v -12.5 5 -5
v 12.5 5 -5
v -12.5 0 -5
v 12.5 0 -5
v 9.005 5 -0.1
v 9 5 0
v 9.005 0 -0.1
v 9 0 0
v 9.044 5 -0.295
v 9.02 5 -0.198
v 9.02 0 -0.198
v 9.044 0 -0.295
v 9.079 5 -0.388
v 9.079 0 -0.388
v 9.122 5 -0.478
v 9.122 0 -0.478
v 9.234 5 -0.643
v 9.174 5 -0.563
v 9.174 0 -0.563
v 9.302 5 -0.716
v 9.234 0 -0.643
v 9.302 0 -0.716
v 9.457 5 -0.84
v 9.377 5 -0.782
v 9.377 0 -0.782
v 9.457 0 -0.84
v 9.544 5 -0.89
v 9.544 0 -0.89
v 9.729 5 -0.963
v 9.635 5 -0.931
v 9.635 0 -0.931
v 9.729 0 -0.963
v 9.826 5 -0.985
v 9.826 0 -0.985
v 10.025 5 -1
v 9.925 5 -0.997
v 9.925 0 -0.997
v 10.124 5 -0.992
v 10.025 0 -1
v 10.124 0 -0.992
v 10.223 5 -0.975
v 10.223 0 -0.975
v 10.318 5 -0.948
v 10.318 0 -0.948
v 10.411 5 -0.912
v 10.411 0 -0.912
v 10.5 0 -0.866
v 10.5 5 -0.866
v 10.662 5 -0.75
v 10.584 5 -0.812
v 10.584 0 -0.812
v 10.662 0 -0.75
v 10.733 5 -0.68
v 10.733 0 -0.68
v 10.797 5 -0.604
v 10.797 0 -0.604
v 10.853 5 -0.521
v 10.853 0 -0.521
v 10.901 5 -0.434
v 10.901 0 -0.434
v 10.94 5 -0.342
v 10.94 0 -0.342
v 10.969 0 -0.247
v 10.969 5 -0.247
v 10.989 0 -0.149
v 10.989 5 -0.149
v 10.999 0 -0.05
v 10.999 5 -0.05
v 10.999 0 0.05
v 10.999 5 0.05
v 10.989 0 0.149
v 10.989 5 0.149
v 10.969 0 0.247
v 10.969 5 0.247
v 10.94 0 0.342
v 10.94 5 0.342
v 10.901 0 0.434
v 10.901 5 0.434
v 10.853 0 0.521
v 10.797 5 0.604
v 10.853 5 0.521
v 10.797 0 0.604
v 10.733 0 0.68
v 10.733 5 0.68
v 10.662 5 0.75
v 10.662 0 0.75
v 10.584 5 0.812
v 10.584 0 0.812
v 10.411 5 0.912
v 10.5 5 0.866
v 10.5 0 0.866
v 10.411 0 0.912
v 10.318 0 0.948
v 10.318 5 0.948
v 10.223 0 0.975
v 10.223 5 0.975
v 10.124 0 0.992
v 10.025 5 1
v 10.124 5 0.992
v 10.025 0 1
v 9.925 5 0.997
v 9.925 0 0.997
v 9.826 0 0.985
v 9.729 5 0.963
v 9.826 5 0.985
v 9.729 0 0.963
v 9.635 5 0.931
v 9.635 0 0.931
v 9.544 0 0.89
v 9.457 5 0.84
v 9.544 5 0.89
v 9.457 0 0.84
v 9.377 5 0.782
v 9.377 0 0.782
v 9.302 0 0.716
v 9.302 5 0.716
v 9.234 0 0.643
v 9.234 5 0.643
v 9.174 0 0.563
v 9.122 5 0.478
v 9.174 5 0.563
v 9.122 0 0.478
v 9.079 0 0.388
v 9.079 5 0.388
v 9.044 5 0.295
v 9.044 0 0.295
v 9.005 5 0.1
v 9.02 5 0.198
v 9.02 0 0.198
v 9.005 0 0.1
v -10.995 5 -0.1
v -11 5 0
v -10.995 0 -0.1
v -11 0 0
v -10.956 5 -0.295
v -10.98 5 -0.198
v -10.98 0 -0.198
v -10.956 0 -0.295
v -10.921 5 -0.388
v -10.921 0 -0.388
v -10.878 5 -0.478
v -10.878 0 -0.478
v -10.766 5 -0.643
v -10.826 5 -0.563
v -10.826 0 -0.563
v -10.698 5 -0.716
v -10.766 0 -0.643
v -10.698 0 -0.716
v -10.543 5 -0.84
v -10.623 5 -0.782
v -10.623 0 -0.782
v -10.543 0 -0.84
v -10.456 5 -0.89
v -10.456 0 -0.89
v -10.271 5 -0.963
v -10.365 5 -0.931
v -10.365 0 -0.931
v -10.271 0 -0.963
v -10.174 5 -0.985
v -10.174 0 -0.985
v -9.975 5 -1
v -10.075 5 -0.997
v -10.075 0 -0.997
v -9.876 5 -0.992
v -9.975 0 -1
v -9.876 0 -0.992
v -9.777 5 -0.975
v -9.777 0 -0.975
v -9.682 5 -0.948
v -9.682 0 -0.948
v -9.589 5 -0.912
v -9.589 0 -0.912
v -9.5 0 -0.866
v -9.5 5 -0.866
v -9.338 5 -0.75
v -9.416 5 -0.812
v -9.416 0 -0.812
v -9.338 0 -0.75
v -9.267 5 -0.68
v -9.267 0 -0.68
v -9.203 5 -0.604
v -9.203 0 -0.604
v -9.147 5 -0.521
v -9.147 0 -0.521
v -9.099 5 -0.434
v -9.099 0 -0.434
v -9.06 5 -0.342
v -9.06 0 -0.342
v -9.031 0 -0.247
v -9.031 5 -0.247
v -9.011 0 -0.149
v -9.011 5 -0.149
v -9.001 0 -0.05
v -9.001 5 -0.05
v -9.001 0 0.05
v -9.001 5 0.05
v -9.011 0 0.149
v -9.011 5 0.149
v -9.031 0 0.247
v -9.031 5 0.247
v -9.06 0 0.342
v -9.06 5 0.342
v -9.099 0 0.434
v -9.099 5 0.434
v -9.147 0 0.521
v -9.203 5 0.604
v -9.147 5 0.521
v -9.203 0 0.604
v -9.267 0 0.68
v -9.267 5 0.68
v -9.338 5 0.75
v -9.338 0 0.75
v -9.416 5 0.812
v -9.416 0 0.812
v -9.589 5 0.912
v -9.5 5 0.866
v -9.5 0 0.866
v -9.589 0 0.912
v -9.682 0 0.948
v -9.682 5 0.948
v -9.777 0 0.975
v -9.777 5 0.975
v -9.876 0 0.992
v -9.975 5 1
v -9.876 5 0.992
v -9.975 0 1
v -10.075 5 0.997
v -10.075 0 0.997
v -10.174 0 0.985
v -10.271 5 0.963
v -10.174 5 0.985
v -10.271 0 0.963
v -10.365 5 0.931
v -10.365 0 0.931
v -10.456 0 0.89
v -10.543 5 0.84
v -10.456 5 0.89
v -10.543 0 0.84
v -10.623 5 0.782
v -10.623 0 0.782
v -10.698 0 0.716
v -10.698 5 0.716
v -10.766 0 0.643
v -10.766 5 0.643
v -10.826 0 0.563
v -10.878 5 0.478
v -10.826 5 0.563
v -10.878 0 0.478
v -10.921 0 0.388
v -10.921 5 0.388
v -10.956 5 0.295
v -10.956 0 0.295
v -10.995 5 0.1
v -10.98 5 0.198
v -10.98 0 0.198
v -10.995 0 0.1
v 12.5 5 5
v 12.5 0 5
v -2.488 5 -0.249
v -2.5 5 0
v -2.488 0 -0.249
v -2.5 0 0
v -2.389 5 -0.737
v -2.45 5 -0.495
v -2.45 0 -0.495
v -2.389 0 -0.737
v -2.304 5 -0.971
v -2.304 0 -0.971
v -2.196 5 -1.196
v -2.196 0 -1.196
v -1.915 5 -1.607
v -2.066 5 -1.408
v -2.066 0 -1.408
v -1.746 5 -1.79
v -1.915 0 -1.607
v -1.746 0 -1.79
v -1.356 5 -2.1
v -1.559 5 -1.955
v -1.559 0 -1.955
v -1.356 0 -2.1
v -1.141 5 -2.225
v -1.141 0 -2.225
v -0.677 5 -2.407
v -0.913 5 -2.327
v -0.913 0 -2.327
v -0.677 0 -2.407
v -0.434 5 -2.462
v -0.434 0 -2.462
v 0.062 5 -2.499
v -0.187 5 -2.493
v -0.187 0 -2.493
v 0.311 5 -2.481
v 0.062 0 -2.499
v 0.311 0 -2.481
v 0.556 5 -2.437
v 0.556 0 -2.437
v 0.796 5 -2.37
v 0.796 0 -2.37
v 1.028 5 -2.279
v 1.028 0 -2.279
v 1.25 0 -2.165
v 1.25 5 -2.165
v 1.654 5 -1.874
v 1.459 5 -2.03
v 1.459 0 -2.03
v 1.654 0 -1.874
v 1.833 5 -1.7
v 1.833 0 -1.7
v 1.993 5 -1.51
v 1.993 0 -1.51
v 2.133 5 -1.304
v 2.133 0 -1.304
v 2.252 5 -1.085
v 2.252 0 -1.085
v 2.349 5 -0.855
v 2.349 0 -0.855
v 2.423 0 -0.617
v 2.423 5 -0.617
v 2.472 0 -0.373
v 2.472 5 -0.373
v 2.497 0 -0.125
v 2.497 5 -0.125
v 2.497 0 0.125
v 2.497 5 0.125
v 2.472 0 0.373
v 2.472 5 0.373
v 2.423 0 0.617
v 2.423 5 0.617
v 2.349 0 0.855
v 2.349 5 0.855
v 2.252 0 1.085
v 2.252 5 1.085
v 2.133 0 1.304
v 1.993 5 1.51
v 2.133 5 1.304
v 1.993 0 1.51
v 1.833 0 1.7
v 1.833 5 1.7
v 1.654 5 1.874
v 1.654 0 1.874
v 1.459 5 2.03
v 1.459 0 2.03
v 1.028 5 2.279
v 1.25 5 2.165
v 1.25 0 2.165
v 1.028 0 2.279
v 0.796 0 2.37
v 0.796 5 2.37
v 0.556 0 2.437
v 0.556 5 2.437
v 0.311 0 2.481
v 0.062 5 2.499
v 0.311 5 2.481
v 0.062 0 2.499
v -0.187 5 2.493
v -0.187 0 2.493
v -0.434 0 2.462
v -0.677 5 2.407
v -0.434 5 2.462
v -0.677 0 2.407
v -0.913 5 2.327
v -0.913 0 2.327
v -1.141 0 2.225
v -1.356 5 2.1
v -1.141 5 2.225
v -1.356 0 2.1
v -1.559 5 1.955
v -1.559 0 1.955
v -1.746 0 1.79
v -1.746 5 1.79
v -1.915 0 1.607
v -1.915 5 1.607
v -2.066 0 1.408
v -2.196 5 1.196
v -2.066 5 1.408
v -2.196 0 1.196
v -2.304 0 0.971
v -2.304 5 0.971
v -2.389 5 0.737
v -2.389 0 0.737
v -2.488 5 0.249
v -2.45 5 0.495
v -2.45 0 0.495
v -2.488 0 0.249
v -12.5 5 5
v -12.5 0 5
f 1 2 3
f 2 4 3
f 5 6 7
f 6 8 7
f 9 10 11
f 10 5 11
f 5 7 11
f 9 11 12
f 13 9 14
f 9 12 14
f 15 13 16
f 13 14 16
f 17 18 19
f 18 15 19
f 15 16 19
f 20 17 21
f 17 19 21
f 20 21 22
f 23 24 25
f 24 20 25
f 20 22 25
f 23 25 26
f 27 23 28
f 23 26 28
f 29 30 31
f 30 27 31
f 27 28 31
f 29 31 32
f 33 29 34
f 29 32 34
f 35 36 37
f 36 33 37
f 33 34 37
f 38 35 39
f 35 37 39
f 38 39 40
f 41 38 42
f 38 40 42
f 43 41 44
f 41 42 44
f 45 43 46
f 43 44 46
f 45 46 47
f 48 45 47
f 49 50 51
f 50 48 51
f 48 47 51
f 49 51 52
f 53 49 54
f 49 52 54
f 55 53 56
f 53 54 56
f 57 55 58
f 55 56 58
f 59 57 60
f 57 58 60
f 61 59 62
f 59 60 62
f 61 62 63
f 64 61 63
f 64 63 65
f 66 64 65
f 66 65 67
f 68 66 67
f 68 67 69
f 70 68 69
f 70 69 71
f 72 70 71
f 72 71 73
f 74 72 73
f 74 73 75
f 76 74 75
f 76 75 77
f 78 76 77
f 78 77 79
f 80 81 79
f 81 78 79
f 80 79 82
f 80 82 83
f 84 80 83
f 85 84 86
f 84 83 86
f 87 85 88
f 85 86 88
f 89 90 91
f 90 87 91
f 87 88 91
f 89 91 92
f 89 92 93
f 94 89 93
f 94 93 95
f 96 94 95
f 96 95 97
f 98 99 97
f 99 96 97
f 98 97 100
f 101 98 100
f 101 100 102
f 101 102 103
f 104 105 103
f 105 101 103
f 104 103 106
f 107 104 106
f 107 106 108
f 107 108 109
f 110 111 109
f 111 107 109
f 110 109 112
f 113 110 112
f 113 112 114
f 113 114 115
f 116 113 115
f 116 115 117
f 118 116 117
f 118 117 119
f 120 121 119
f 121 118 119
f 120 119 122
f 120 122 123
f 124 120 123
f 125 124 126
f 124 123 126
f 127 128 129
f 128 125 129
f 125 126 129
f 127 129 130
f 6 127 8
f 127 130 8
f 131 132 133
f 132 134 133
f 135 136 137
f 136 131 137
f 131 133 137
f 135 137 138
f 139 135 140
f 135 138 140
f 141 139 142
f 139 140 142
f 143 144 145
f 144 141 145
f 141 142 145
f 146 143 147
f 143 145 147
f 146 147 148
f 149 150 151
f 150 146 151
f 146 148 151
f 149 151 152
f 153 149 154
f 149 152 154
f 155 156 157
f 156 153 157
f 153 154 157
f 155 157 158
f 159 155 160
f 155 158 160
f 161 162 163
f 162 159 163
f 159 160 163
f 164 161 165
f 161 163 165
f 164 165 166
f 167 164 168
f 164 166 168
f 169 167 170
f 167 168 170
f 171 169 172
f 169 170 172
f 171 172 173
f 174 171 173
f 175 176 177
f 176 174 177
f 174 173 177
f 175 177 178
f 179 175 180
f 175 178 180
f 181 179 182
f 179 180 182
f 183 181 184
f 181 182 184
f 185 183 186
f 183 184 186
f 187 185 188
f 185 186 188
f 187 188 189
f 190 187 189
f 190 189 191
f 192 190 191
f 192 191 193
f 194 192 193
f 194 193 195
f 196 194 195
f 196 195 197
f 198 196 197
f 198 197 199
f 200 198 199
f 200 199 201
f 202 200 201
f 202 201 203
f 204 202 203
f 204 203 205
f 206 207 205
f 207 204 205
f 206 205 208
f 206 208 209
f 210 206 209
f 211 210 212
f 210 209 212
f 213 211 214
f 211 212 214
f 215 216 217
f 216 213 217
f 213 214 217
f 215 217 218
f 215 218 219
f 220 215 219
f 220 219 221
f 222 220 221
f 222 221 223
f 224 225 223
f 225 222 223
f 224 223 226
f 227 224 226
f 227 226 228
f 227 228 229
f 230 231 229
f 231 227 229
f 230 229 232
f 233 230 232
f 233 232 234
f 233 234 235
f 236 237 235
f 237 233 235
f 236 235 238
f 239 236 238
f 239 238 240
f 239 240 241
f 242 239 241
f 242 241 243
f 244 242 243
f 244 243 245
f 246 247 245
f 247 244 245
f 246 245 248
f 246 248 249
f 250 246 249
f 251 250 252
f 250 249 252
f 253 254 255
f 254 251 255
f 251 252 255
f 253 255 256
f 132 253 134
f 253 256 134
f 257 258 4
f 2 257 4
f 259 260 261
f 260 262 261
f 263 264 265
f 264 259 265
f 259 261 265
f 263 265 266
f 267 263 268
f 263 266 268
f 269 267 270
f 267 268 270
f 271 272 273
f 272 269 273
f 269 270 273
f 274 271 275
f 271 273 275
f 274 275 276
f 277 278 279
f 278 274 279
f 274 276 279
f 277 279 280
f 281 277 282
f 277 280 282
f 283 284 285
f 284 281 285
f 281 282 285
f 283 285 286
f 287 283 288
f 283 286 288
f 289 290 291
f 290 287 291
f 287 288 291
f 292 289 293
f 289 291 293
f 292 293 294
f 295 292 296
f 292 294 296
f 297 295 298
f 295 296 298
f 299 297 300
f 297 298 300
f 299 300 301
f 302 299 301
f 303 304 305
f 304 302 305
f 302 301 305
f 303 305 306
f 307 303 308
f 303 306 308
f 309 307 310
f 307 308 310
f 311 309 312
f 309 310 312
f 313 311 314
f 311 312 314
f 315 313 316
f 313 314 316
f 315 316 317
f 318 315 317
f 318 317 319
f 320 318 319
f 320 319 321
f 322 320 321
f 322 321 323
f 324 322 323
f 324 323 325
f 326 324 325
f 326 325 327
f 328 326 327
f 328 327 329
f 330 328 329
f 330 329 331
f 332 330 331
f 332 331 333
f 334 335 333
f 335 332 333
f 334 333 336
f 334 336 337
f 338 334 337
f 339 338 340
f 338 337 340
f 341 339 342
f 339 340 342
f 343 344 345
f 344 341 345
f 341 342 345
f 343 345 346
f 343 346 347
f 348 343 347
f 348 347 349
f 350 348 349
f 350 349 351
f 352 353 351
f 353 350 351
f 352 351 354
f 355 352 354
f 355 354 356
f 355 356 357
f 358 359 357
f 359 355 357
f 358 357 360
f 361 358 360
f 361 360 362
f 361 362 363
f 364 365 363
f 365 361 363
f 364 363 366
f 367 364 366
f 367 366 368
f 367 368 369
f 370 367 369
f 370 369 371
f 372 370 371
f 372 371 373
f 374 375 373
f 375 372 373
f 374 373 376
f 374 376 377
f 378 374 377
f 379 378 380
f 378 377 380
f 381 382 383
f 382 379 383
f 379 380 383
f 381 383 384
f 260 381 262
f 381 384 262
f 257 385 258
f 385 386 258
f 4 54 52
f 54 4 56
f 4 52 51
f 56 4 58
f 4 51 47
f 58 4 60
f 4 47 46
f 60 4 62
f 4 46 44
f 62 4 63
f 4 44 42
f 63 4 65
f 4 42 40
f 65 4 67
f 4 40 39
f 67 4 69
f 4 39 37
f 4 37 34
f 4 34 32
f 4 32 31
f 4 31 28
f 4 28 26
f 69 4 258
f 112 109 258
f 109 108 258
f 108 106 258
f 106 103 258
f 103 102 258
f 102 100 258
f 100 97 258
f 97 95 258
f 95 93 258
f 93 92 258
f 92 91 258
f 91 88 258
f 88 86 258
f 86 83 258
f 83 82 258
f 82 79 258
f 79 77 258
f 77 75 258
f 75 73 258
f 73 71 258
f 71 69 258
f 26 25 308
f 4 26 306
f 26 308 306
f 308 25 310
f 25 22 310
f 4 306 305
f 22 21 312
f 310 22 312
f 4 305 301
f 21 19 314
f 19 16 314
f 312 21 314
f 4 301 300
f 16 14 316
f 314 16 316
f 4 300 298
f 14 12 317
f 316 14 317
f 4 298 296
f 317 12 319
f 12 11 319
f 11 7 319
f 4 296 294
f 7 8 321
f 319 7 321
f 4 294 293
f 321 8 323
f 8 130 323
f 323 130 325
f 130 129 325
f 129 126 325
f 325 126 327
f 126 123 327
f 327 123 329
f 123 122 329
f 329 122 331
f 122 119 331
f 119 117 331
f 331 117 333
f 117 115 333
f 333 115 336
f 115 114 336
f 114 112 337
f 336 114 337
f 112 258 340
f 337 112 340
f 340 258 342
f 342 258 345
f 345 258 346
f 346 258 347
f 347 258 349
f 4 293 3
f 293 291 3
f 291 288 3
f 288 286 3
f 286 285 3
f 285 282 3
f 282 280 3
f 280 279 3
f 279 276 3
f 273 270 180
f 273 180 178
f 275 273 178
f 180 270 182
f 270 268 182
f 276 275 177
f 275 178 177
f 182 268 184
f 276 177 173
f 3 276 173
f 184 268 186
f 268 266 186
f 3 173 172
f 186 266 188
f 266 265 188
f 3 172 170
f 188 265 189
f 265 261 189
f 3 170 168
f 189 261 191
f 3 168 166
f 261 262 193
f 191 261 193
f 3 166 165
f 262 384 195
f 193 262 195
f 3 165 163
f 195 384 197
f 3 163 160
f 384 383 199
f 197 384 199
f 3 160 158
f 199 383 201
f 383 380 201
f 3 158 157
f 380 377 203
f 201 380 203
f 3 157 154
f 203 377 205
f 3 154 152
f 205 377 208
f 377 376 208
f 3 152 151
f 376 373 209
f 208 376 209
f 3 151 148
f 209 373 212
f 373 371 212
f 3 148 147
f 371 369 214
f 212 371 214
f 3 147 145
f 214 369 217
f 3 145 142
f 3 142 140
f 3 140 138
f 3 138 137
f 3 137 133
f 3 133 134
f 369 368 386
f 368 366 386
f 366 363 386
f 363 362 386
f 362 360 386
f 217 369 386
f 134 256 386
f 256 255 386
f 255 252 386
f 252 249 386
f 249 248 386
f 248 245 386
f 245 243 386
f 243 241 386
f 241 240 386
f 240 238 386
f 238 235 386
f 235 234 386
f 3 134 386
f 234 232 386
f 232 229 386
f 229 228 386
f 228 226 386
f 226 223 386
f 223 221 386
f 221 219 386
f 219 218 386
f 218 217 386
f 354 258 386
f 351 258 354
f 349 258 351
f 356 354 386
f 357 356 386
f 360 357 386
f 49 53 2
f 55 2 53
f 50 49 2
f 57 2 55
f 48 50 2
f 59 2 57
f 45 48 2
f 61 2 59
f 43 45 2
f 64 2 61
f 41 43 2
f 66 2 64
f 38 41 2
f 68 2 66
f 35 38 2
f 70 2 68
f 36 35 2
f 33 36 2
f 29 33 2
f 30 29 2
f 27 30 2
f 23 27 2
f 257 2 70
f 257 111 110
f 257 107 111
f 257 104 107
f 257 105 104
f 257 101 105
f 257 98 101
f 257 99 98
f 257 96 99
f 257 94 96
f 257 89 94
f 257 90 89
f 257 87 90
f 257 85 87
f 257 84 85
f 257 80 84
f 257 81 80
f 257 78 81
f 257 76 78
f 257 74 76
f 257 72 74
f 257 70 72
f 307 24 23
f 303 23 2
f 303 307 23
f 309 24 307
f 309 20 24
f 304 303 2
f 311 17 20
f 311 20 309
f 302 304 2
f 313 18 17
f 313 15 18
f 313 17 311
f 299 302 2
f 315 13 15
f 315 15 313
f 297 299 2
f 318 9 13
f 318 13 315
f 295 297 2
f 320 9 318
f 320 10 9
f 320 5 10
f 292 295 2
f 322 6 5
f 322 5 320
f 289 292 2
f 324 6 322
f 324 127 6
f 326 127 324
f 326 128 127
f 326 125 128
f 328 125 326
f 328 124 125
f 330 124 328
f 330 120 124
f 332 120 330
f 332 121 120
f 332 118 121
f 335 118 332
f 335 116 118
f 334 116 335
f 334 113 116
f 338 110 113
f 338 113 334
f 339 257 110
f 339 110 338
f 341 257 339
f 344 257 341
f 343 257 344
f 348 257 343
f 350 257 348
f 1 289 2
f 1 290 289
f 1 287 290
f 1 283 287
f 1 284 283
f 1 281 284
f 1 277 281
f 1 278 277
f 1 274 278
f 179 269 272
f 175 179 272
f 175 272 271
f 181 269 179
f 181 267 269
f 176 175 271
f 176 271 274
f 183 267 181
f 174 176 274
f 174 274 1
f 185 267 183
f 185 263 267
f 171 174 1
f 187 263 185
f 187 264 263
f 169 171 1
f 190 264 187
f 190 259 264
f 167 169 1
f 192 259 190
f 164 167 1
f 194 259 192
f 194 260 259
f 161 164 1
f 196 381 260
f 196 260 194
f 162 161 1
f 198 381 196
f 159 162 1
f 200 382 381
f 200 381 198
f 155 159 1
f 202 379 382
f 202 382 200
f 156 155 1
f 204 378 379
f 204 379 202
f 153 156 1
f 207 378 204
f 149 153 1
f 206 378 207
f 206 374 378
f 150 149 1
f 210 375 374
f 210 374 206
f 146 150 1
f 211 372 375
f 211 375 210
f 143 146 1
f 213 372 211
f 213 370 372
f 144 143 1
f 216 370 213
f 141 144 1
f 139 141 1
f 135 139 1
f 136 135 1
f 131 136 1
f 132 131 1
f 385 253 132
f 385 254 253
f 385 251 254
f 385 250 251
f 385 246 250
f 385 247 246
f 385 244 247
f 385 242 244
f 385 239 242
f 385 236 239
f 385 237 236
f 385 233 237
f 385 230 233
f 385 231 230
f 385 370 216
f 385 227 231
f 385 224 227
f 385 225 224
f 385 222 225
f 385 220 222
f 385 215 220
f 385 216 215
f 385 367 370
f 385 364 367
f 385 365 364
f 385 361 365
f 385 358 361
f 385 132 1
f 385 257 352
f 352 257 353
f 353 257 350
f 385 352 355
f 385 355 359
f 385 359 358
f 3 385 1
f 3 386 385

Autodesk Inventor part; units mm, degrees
ref_plane "YZ Plane" through (0, 0, 0) normal (1, 0, 0) x (0, 1, 0)
ref_plane "XZ Plane" through (0, 0, 0) normal (0, 1, 0) x (-1, 0, 0)
ref_plane "XY Plane" through (0, 0, 0) normal (0, 0, 1) x (1, 0, 0)
sketch "Sketch1" plane through (0, 0, 0) normal (0, 1, 0) x (-1, 0, 0)
  line L0 (-12.5, -5) -> (12.5, -5)
  line L1 (12.5, 0) -> (12.5, 0)
  line L2 (12.5, 5) -> (-12.5, 5)
  line L3 (-12.5, 0) -> (-12.5, 0)
  line L4 (-12.5, -5) -> (12.5, 5) construction
  line L5 (12.5, -5) -> (-12.5, 5) construction
  circle A0 centre (10, 0) radius 1
  circle A1 centre (0, 0) radius 2.5
  line L6 (-12.5, 5) -> (-12.5, -5)
  line L7 (12.5, 5) -> (12.5, -5)
  circle A2 centre (-10, 0) radius 1
  point P0 (0, 0)
  dimension "d0" = 10
  dimension "d1" = 25
  dimension "d3" = 2
  dimension "d4" = 5
  dimension "d6" = 2.5
  dimension "d7" = 5
  dimension "d8" = 5
  dimension "d12" = 0
  dimension "d13" = 2
  dimension "d14" = 2.5
  dimension "d15" = 5
extrude "Extrusion1" add sketch "Sketch1" along normal blind 5
properties part number "link"
